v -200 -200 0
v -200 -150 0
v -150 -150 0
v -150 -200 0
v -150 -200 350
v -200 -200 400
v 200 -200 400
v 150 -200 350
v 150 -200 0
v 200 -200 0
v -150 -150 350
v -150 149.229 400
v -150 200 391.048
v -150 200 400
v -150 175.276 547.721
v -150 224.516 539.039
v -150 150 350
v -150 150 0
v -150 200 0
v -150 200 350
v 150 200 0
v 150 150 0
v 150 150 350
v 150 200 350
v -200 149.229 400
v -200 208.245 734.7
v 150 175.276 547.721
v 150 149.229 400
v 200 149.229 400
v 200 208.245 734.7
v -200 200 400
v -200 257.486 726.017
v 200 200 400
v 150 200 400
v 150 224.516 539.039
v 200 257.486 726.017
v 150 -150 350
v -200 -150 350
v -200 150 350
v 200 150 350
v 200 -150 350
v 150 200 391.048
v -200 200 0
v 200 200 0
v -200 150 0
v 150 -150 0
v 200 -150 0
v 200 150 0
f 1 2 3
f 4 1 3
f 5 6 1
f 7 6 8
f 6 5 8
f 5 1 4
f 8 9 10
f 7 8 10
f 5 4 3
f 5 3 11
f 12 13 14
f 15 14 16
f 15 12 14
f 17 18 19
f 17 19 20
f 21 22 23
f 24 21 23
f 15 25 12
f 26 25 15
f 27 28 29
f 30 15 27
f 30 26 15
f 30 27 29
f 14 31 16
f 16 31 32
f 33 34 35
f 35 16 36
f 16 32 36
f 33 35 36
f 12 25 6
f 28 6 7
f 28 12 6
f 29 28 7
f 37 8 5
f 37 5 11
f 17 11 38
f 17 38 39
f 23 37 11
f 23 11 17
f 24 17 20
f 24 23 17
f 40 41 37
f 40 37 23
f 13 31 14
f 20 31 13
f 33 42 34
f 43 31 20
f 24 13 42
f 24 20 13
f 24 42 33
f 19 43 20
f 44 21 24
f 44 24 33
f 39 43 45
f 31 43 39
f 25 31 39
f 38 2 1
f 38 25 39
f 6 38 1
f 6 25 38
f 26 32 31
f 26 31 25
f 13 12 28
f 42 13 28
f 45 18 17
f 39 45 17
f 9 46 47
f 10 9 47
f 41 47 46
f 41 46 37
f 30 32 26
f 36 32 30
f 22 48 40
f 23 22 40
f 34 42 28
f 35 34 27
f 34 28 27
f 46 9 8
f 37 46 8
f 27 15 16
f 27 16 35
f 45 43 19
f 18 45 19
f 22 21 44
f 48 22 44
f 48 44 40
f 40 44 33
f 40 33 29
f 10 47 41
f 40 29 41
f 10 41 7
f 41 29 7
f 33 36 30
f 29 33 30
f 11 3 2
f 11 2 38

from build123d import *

# Parameters (mm, degrees)
F0_W      = 400
F0_H      = 400
F1_DEPTH  = 400
F2_W      = 300
F2_H      = 350
F3_DEPTH  = 400.001
F4_W      = 300
F4_H      = 350
F5_DEPTH  = 400.001
F8_W      = 400
F8_H      = 330.777927181
F9_DEPTH  = 50
F10_DEPTH = 9.0852224141
F11_W     = 300
F11_H     = 150
F12_DEPTH = 176.0726081542


with BuildPart() as f1:
    # F0 (on Top) → F1 (new body)
    with BuildSketch(Plane.XY):
        Rectangle(F0_W, F0_H)
    extrude(amount=F1_DEPTH)

    # F2 (on face) → F3 (cut, through all)
    with BuildSketch(Plane.XZ.offset(200)):
        with Locations((0, 175)):
            Rectangle(F2_W, F2_H)
    extrude(amount=-F3_DEPTH, mode=Mode.SUBTRACT)

    # F4 (on face) → F5 (cut, through all)
    with BuildSketch(Plane.YZ.offset(200)):
        with Locations((0, 175)):
            Rectangle(F4_W, F4_H)
    extrude(amount=-F5_DEPTH, mode=Mode.SUBTRACT)



with BuildPart() as f9:
    # F8 (on face) → F9 (new body)
    with BuildSketch(Plane(origin=(0, 125.5652334135, -22.1405384897), x_dir=(1, 0, 0), z_dir=(0, -0.984807753, 0.1736481777))):
        with Locations((0, 594.3105737075)):
            Rectangle(F8_W, F8_H)
    extrude(amount=F9_DEPTH)


with BuildPart() as f1_1:
    add(f1.part)
    # F10 (add, through all): a face of the model
    f10_faces = [f9.part.faces().sort_by_distance(p)[0] for p in [
        (0, 175.4264955469, 404.6059930296),
    ]]

    add(f9.part)  # F10 merges F9
    extrude(f10_faces, amount=F10_DEPTH)

    # F11 (on face) → F12 (cut, through all)
    with BuildSketch(Plane(origin=(0, 76.3248457628, -13.4581296064), x_dir=(1, 0, 0), z_dir=(0, -0.984807753, 0.1736481777))):
        with Locations((0, 494.8363877028)):
            Rectangle(F11_W, F11_H)
    extrude(amount=-F12_DEPTH, mode=Mode.SUBTRACT)


solid = f1_1.part
